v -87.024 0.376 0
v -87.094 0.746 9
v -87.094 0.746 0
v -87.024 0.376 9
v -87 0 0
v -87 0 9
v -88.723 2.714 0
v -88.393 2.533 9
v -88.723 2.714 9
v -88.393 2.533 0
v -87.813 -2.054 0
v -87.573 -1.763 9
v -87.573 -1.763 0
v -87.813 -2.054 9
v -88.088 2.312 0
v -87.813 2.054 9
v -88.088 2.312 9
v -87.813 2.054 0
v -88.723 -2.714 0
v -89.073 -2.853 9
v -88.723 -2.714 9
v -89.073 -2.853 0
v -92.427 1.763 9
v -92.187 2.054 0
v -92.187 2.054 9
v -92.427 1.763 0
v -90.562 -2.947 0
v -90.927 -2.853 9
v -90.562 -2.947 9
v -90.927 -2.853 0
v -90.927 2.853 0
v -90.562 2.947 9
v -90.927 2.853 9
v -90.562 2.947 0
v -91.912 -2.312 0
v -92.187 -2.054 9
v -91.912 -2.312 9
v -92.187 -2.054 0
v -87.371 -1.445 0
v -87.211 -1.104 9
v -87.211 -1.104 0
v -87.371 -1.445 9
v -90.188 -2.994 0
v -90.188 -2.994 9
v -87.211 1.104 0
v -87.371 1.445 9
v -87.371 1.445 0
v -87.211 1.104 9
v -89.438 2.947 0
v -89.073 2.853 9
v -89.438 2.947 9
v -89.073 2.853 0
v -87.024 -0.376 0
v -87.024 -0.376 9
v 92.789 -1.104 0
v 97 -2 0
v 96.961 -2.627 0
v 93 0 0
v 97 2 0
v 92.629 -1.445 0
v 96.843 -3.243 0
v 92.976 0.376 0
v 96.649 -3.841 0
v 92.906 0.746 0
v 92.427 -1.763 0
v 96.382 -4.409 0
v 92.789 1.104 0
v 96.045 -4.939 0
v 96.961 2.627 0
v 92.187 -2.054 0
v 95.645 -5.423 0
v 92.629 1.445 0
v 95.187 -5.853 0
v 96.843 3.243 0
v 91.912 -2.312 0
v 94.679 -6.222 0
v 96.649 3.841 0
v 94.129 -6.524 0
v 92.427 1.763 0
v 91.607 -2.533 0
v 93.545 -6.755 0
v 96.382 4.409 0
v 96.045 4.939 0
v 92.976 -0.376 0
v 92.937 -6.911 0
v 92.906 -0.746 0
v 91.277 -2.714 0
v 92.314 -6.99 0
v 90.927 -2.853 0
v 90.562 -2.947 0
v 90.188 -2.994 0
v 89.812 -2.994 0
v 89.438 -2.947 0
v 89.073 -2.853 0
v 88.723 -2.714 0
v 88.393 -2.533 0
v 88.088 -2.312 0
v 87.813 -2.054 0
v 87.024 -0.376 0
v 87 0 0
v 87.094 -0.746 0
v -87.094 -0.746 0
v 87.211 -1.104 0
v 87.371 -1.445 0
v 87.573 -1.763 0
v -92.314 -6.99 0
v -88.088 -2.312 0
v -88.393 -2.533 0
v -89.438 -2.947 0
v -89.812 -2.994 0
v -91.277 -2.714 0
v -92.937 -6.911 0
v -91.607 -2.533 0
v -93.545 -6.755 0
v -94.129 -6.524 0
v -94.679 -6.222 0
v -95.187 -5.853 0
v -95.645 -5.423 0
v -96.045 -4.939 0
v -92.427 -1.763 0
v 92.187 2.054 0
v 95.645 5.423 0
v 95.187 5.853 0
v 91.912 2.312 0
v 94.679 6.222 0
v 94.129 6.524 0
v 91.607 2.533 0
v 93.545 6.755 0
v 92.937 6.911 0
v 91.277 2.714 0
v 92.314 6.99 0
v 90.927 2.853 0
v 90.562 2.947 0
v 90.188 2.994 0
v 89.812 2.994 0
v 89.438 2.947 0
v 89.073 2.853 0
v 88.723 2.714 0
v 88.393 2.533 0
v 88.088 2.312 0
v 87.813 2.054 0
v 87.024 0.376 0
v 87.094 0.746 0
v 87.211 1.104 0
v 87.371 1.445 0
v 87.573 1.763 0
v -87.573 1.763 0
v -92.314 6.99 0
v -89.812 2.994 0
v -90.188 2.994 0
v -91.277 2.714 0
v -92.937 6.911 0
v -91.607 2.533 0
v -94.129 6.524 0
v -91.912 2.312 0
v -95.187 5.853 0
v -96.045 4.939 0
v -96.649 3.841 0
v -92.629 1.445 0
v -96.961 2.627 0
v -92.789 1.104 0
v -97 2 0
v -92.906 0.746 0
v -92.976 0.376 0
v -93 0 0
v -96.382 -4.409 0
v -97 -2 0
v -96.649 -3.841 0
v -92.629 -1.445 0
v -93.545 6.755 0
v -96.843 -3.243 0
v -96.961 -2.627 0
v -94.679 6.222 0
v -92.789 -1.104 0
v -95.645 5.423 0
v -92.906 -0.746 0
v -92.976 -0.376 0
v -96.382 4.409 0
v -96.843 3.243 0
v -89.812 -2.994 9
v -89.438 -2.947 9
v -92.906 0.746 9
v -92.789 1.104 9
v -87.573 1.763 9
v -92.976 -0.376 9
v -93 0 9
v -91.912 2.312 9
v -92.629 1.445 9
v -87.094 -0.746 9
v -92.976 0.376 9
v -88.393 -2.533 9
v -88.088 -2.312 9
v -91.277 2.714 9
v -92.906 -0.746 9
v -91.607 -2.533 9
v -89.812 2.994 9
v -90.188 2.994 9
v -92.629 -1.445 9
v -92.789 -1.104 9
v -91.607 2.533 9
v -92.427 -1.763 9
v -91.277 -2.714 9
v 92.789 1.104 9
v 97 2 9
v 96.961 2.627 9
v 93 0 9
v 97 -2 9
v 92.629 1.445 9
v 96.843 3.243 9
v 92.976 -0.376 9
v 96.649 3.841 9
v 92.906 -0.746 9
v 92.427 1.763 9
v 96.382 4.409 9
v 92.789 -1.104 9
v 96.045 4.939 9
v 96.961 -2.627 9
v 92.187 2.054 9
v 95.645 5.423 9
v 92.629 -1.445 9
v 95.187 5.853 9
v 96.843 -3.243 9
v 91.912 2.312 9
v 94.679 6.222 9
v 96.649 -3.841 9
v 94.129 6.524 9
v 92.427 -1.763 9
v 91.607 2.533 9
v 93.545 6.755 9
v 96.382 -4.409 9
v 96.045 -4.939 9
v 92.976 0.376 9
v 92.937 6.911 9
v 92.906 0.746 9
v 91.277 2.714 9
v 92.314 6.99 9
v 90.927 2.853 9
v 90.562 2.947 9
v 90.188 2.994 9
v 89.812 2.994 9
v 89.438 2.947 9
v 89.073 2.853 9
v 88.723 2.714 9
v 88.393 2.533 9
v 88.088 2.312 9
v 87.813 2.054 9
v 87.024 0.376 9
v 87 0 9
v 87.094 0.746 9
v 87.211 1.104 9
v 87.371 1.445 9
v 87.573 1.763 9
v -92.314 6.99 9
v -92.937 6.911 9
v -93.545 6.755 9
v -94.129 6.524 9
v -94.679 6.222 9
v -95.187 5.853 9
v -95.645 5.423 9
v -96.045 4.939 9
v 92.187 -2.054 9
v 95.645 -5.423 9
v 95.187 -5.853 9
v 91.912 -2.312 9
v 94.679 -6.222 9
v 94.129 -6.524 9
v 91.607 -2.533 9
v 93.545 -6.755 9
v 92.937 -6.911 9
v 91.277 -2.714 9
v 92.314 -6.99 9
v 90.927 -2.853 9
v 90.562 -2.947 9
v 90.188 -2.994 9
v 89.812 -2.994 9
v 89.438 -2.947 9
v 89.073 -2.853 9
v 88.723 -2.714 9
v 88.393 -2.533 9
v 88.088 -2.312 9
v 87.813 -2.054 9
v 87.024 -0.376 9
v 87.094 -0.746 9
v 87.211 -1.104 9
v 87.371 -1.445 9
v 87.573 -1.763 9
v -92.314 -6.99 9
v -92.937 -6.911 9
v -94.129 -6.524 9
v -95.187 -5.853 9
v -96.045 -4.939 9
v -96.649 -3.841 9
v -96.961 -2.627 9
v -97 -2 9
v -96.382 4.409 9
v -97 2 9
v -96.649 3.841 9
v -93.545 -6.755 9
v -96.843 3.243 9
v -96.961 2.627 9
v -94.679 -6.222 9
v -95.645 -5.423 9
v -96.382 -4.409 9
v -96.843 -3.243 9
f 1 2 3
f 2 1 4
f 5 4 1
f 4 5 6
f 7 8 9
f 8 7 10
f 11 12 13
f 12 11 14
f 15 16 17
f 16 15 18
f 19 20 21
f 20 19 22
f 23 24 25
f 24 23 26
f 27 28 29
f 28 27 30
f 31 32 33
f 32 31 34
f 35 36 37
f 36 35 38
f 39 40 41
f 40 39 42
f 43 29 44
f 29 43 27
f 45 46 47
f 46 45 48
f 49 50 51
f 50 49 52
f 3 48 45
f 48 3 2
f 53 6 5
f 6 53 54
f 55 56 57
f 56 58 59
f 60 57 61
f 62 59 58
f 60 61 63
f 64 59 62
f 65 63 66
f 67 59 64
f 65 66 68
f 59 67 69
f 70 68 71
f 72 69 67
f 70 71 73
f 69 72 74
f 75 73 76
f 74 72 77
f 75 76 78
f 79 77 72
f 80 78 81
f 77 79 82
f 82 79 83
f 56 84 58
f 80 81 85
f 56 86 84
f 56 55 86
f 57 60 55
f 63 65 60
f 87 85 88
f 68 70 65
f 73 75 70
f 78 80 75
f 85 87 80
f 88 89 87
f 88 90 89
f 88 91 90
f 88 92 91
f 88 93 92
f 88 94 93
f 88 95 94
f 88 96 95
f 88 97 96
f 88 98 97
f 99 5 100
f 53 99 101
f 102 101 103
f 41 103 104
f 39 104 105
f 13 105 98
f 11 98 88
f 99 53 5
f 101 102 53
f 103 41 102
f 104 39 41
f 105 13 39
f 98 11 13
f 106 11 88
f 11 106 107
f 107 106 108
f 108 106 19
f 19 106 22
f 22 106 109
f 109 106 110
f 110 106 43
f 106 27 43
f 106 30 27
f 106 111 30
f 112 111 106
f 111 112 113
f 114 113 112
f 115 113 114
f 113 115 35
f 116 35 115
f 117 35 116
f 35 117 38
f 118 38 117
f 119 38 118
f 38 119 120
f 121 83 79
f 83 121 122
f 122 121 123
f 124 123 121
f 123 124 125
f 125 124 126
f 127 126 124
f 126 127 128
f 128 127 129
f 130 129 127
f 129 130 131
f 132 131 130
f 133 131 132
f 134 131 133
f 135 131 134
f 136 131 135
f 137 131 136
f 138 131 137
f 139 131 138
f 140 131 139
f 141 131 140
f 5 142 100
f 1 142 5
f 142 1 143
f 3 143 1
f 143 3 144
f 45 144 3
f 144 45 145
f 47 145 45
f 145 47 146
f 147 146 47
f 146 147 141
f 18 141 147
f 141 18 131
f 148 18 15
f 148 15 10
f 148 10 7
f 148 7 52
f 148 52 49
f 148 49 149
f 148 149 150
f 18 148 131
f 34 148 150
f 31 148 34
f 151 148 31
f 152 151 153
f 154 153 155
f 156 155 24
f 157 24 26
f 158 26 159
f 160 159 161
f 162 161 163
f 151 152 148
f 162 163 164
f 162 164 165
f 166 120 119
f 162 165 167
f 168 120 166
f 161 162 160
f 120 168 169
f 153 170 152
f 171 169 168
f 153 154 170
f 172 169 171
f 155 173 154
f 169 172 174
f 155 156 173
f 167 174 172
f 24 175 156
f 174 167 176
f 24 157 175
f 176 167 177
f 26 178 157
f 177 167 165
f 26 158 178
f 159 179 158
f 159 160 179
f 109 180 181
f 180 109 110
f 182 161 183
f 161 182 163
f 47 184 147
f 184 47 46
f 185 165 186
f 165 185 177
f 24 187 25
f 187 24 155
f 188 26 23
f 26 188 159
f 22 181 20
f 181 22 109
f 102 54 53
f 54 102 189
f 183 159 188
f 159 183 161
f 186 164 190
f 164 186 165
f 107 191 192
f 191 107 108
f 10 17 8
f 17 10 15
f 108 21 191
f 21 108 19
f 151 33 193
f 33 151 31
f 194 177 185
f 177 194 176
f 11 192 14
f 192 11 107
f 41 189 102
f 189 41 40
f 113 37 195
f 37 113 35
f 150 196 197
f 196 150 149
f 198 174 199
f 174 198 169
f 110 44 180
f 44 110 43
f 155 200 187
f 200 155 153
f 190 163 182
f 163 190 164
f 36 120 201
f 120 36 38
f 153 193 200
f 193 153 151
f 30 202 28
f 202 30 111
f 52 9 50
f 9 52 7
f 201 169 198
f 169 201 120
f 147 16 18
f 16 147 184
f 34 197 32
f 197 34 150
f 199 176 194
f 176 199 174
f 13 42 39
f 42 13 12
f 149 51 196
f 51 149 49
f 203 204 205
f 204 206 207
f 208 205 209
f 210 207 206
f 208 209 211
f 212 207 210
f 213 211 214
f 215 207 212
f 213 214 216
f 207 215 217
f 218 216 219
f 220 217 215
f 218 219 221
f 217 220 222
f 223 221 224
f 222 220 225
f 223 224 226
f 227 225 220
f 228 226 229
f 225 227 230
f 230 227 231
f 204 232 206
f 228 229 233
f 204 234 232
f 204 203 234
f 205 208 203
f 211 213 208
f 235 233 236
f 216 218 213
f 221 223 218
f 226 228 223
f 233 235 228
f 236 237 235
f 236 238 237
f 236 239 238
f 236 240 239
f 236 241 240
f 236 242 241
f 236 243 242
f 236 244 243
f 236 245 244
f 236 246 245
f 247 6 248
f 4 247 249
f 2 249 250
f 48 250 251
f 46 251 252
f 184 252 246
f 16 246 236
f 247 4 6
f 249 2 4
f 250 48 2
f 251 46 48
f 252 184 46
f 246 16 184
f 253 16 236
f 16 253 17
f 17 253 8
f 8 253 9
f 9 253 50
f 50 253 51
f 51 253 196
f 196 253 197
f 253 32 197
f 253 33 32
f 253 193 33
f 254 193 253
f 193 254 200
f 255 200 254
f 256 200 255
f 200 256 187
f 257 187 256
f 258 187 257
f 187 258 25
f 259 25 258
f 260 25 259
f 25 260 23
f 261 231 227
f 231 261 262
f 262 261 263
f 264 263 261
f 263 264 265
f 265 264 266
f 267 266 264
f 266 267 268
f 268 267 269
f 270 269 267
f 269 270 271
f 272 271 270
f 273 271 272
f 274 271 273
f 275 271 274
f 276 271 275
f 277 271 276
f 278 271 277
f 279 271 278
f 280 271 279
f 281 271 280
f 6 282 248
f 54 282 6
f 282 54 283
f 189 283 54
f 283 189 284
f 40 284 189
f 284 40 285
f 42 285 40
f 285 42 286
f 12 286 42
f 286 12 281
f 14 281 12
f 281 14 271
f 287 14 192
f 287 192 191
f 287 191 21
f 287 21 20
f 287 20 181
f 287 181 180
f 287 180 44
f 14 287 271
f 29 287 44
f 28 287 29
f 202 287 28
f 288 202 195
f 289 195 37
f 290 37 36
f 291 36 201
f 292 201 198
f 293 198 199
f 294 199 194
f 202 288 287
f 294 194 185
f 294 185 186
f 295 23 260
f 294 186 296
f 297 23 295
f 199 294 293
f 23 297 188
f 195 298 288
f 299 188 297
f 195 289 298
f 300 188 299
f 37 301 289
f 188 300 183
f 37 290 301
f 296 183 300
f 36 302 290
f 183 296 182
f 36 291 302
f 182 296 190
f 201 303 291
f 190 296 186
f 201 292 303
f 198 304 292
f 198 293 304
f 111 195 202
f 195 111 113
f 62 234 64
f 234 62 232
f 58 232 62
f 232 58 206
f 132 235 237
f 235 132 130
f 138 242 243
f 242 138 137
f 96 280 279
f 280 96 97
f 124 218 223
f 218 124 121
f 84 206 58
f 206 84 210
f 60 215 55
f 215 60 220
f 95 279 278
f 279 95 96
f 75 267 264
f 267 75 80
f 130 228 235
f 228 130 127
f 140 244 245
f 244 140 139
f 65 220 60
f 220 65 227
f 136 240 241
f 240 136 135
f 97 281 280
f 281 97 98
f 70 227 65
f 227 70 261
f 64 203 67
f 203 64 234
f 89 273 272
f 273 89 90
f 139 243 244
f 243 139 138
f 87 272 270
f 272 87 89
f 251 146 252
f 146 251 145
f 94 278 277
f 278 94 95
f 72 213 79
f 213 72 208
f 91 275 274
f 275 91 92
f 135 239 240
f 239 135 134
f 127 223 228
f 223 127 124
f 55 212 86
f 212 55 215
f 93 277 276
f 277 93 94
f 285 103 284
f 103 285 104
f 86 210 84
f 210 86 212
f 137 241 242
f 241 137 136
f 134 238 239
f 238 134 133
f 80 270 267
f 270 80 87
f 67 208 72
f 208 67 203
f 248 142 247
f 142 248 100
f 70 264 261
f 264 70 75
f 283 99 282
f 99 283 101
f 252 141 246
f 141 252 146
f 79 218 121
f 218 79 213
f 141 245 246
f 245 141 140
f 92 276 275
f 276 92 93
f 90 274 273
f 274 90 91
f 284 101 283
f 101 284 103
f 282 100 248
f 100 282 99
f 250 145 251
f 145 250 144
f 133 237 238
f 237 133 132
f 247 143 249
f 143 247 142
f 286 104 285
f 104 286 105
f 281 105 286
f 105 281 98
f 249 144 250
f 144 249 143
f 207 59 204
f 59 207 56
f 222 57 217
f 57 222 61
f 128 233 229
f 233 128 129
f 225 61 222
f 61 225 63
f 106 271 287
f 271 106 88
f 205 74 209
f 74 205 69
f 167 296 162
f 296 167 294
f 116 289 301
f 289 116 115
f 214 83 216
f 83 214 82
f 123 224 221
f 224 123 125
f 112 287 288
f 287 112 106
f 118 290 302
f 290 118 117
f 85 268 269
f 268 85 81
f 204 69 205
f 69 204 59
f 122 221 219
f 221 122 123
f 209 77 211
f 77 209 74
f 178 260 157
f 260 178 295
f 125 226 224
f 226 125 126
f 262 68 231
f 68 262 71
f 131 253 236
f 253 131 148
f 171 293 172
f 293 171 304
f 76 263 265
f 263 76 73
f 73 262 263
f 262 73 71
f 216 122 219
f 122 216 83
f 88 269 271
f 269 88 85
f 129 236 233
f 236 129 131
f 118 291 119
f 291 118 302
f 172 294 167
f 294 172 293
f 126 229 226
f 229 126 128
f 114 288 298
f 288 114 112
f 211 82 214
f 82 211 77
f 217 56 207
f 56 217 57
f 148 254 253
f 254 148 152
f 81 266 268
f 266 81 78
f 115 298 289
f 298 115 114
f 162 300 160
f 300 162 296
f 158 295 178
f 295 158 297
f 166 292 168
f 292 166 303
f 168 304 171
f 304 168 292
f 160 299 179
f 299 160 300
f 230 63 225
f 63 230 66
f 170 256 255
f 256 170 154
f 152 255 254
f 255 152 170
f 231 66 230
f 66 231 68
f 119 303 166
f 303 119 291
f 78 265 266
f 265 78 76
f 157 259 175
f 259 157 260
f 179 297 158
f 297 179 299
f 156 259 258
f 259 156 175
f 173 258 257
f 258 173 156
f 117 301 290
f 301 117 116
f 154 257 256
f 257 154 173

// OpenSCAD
$fn = 50;


difference() {
	union() {
		hull() {
			translate(v = [-92.0000000000, 2.0000000000, 0]) {
				cylinder(h = 9, r = 5);
			}
			translate(v = [92.0000000000, 2.0000000000, 0]) {
				cylinder(h = 9, r = 5);
			}
			translate(v = [-92.0000000000, -2.0000000000, 0]) {
				cylinder(h = 9, r = 5);
			}
			translate(v = [92.0000000000, -2.0000000000, 0]) {
				cylinder(h = 9, r = 5);
			}
		}
	}
	union() {
		translate(v = [-90.0000000000, 0.0000000000, 0]) {
			cylinder(h = 9, r = 3.0000000000);
		}
		translate(v = [90.0000000000, 0.0000000000, 0]) {
			cylinder(h = 9, r = 3.0000000000);
		}
		translate(v = [-90.0000000000, 0.0000000000, 0]) {
			cylinder(h = 9, r = 1.5000000000);
		}
		translate(v = [90.0000000000, 0.0000000000, 0]) {
			cylinder(h = 9, r = 1.5000000000);
		}
		translate(v = [-90.0000000000, 0.0000000000, 0]) {
			cylinder(h = 9, r = 1.5000000000);
		}
		translate(v = [90.0000000000, 0.0000000000, 0]) {
			cylinder(h = 9, r = 1.5000000000);
		}
		translate(v = [-90.0000000000, 0.0000000000, 0]) {
			cylinder(h = 9, r = 1.5000000000);
		}
		translate(v = [90.0000000000, 0.0000000000, 0]) {
			cylinder(h = 9, r = 1.5000000000);
		}
	}
}
